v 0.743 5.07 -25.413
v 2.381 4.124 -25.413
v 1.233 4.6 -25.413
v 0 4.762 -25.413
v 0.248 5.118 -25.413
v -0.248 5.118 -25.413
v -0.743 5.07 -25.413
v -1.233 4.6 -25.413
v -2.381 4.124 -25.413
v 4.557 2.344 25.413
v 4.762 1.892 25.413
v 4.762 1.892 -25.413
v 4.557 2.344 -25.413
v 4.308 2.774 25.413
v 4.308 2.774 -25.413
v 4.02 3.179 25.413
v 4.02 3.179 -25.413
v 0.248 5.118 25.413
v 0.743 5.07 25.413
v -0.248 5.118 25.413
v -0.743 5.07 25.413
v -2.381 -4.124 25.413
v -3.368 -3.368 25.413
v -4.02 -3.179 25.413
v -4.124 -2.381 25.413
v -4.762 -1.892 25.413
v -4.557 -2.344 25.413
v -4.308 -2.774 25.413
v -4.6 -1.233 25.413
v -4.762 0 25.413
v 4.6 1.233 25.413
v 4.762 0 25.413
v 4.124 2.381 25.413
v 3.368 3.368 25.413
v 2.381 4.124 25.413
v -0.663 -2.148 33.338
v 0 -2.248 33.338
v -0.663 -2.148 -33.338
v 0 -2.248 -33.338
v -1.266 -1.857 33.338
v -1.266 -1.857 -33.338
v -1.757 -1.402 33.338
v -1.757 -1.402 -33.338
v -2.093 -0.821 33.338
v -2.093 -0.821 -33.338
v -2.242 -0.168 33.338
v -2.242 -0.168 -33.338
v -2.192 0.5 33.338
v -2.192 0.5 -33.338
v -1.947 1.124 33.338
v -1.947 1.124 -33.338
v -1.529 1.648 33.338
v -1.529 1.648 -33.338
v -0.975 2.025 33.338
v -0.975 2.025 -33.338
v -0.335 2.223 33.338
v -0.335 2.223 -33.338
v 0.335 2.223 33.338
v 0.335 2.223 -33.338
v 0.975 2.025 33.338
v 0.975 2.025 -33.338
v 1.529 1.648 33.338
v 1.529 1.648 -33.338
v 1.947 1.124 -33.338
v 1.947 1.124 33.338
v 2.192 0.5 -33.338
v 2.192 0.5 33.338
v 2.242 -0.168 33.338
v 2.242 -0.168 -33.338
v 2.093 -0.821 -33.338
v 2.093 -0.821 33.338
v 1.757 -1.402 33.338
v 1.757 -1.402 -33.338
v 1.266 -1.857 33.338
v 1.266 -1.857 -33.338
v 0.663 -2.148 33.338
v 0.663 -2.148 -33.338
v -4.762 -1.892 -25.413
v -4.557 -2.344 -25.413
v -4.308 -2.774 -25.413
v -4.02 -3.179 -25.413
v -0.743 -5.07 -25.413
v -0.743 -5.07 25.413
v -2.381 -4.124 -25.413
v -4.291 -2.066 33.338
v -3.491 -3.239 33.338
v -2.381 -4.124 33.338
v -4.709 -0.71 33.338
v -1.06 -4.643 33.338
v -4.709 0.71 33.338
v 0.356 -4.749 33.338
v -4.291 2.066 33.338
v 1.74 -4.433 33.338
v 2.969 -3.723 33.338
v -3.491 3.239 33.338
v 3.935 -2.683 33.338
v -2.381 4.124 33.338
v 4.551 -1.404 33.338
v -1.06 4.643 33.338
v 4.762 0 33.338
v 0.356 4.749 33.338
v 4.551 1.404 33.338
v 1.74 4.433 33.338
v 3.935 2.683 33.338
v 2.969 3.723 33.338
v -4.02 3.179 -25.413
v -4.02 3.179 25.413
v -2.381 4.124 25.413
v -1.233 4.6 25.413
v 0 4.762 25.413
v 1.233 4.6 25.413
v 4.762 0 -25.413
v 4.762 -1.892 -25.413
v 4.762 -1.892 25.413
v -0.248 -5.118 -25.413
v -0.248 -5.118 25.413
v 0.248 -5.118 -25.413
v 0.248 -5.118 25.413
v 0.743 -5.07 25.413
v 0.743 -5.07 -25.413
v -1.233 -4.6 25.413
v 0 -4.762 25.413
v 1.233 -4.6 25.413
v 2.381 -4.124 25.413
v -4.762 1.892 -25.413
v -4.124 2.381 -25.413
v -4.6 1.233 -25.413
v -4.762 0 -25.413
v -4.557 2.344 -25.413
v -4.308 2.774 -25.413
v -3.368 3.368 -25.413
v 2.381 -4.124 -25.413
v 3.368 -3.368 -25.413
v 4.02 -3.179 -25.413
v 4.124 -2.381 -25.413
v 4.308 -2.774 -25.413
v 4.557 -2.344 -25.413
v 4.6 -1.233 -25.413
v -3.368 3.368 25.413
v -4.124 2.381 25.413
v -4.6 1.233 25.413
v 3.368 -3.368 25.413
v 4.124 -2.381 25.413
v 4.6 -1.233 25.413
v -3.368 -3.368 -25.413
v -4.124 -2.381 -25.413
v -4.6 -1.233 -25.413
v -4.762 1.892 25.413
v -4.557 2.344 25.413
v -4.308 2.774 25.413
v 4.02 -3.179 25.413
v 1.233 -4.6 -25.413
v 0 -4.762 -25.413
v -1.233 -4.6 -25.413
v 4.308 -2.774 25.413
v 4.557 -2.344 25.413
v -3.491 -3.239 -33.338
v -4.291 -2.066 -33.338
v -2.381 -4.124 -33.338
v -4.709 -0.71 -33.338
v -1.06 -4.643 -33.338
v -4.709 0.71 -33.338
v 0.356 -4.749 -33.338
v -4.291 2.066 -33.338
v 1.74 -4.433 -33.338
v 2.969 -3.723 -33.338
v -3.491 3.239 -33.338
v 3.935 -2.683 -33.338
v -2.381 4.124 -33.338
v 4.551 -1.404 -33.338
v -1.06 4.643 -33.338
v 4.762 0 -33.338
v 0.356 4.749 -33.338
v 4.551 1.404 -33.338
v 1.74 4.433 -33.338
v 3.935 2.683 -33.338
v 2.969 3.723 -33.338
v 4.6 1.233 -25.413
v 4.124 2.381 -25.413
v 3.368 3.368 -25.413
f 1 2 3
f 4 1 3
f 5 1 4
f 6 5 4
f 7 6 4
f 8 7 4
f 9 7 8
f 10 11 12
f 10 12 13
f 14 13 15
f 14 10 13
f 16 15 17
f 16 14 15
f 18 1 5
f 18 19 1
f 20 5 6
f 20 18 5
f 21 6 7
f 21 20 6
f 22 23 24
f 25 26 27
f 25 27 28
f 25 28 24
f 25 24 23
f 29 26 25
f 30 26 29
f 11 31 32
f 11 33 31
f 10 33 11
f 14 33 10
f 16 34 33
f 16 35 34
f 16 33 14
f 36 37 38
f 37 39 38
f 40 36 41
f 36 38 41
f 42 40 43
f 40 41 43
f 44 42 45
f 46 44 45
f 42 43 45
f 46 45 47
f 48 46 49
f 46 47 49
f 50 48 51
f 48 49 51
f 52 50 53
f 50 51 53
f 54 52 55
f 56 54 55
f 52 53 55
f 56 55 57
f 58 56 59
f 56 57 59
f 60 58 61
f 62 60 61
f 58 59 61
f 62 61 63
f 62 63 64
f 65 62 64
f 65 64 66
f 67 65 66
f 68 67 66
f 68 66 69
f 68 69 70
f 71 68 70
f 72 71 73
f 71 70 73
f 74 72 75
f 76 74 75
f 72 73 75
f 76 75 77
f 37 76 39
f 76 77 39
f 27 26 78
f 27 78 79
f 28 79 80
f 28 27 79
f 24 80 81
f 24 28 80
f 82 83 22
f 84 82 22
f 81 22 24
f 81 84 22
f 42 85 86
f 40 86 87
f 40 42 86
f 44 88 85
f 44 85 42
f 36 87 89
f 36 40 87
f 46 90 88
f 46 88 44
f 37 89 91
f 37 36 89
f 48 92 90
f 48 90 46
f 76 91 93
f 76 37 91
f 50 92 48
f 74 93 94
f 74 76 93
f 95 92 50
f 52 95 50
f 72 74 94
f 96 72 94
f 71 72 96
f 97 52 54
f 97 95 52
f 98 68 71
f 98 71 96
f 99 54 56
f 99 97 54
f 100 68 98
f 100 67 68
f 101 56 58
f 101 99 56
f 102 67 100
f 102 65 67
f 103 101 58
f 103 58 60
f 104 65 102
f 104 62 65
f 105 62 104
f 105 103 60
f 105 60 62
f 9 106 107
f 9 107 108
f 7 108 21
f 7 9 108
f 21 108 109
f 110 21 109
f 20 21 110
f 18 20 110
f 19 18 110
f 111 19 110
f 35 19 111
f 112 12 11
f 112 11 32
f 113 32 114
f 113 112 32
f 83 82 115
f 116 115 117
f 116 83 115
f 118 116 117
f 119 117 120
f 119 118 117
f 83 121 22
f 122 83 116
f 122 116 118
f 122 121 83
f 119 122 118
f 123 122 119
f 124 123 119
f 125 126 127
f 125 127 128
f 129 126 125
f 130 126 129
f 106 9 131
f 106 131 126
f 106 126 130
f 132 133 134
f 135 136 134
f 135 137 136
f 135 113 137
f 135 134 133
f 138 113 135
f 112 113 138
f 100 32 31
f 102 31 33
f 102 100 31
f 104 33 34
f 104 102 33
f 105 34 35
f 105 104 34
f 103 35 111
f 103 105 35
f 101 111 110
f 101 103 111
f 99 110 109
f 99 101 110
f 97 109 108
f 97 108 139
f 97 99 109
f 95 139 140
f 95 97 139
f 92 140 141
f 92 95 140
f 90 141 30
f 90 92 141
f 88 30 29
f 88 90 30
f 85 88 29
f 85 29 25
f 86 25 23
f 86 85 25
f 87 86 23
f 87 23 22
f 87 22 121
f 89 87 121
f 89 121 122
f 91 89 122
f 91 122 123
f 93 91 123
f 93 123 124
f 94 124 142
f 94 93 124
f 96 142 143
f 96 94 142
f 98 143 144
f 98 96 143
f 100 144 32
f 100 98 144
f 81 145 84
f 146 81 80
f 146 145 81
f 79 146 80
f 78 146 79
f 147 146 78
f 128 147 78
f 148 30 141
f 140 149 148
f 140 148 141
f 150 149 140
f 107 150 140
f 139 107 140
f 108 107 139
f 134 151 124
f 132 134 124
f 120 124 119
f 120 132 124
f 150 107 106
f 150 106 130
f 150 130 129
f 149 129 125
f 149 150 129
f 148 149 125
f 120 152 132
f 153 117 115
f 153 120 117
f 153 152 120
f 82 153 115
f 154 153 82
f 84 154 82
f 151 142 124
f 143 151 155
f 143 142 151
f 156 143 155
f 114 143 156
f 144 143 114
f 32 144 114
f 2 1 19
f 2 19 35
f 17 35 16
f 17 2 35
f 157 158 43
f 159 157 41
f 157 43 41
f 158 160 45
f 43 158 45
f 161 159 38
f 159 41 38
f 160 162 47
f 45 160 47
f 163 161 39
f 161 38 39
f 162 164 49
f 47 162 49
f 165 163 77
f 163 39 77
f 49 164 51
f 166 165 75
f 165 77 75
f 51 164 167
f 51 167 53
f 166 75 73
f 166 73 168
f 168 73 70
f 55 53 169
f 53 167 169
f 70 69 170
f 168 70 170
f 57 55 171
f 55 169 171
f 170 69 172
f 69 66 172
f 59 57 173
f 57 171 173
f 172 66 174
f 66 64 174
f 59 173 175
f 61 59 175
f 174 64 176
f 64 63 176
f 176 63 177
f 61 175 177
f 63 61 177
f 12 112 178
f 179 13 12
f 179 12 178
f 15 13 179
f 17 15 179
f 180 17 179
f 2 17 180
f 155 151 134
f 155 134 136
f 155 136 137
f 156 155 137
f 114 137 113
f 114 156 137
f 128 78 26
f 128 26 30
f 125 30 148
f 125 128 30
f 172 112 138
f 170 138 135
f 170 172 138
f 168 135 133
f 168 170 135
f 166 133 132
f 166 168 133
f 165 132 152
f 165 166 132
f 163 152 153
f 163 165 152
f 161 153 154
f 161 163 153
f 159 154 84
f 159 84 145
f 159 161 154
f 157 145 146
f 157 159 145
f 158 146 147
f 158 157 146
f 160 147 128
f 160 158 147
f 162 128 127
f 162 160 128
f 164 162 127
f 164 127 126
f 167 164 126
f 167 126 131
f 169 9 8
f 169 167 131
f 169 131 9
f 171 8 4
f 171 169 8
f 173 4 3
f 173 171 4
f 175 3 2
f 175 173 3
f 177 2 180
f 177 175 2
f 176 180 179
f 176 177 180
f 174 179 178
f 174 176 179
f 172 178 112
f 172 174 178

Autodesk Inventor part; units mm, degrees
ref_plane "YZ Plane" through (0, 0, 0) normal (1, 0, 0) x (0, 1, 0)
ref_plane "XZ Plane" through (0, 0, 0) normal (0, 1, 0) x (-1, 0, 0)
ref_plane "XY Plane" through (0, 0, 0) normal (0, 0, 1) x (1, 0, 0)
sketch "Sketch1" plane through (0, 0, 0) normal (0, 0, 1) x (1, 0, 0)
  line L0 (-4.7625, -2.7496) -> (-4.7625, 2.7496)
  line L1 (-4.7625, 2.7496) -> (0, 5.4993)
  line L2 (0, 5.4993) -> (4.7625, 2.7496)
  line L3 (4.7625, 2.7496) -> (4.7625, -2.7496)
  line L4 (4.7625, -2.7496) -> (0, -5.4993)
  line L5 (0, -5.4993) -> (-4.7625, -2.7496)
  point P0 (0, 0)
  point P1 (0, 0)
  dimension "Size" = 9.525
extrude "Extrusion1" add sketch "Sketch1" along normal mid plane 66.675
sketch "Sketch3" plane through (0, 0, 33.3375) normal (0, 0, 1) x (1, 0, 0)
  line L0 (-4.7625, 2.7496) -> (0, 5.4993) construction
  line L1 (0, 5.4993) -> (4.7625, 2.7496) construction
  line L2 (4.7625, 2.7496) -> (4.7625, -2.7496) construction
  line L3 (4.7625, -2.7496) -> (0, -5.4993) construction
  line L4 (0, -5.4993) -> (-4.7625, -2.7496) construction
  line L5 (-4.7625, -2.7496) -> (-4.7625, 2.7496) construction
  point P0 (0, 0)
hole "Hole1" at (0, 0, 33.3375) direction (0, 0, -1) diameter 4.4958 end through all
sketch "Sketch4" plane through (0, 0, 33.3375) normal (0, 0, 1) x (1, 0, 0)
  circle A0 centre (0, 0) radius 2.2479 construction
  line L0 (-4.7625, 2.7496) -> (0, 5.4993) construction
  line L1 (0, 5.4993) -> (4.7625, 2.7496) construction
  line L2 (4.7625, 2.7496) -> (4.7625, -2.7496) construction
  line L3 (4.7625, -2.7496) -> (0, -5.4993) construction
  line L4 (0, -5.4993) -> (-4.7625, -2.7496) construction
  line L5 (-4.7625, -2.7496) -> (-4.7625, 2.7496) construction
  circle A1 centre (0, 0) radius 5.1245
  circle A2 centre (0, 0) radius 8.89
  dimension "thunder" = 10.2489
  dimension "d16" = 17.78
extrude "Extrusion3" cut sketch "Sketch4" against normal through all
sketch "Sketch5" plane through (0, 0, 33.3375) normal (0, 0, 1) x (1, 0, 0)
  circle A0 centre (0, 0) radius 2.2479 projected
  circle A1 centre (0, 0) radius 4.7625
  line L0 (4.7625, -1.8917) -> (4.7625, 1.8917) projected
  line L1 (4.0195, 3.1786) -> (0.743, 5.0703) projected
  line L2 (-0.743, 5.0703) -> (-4.0195, 3.1786) projected
  line L3 (-4.7625, 1.8917) -> (-4.7625, -1.8917) projected
  line L4 (-4.0195, -3.1786) -> (-0.743, -5.0703) projected
  line L5 (0.743, -5.0703) -> (4.0195, -3.1786) projected
  circle A2 centre (0, 0) radius 2.2479 projected
  arc A3 (4.0195, -3.1786) -> (4.7625, -1.8917) centre (0, 0) ccw projected
  arc A4 (4.7625, 1.8917) -> (4.0195, 3.1786) centre (0, 0) ccw projected
  arc A5 (0.743, 5.0703) -> (-0.743, 5.0703) centre (0, 0) ccw projected
  arc A6 (-4.0195, 3.1786) -> (-4.7625, 1.8917) centre (0, 0) ccw projected
  arc A7 (-4.7625, -1.8917) -> (-4.0195, -3.1786) centre (0, 0) ccw projected
  arc A8 (-0.743, -5.0703) -> (0.743, -5.0703) centre (0, 0) ccw projected
  point P0 (2.3813, -4.1244)
  point P1 (-2.3813, -4.1244)
  point P2 (-4.7625, 0)
  point P3 (-2.3813, 4.1244)
  point P4 (2.3812, 4.1244)
  point P5 (4.7625, 0)
  dimension "d21" = 9.525
extrude "Extrusion4" cut sketch "Sketch5" against normal blind 7.9248 contours L0 A3 L5 A1 | A1 L1 A4 L0 | A1 L2 A5 L1 | L5 A8 L4 A1 | A1 L3 A6 L2 | L4 A7 L3 A1
mirror "Mirror2" about plane through (0, 0, 0) normal (0, 0, 1) of "Extrusion4"
equation "\"bearing\" = 25.4"
properties part number "GP10-008" material "Aluminum 6061"
